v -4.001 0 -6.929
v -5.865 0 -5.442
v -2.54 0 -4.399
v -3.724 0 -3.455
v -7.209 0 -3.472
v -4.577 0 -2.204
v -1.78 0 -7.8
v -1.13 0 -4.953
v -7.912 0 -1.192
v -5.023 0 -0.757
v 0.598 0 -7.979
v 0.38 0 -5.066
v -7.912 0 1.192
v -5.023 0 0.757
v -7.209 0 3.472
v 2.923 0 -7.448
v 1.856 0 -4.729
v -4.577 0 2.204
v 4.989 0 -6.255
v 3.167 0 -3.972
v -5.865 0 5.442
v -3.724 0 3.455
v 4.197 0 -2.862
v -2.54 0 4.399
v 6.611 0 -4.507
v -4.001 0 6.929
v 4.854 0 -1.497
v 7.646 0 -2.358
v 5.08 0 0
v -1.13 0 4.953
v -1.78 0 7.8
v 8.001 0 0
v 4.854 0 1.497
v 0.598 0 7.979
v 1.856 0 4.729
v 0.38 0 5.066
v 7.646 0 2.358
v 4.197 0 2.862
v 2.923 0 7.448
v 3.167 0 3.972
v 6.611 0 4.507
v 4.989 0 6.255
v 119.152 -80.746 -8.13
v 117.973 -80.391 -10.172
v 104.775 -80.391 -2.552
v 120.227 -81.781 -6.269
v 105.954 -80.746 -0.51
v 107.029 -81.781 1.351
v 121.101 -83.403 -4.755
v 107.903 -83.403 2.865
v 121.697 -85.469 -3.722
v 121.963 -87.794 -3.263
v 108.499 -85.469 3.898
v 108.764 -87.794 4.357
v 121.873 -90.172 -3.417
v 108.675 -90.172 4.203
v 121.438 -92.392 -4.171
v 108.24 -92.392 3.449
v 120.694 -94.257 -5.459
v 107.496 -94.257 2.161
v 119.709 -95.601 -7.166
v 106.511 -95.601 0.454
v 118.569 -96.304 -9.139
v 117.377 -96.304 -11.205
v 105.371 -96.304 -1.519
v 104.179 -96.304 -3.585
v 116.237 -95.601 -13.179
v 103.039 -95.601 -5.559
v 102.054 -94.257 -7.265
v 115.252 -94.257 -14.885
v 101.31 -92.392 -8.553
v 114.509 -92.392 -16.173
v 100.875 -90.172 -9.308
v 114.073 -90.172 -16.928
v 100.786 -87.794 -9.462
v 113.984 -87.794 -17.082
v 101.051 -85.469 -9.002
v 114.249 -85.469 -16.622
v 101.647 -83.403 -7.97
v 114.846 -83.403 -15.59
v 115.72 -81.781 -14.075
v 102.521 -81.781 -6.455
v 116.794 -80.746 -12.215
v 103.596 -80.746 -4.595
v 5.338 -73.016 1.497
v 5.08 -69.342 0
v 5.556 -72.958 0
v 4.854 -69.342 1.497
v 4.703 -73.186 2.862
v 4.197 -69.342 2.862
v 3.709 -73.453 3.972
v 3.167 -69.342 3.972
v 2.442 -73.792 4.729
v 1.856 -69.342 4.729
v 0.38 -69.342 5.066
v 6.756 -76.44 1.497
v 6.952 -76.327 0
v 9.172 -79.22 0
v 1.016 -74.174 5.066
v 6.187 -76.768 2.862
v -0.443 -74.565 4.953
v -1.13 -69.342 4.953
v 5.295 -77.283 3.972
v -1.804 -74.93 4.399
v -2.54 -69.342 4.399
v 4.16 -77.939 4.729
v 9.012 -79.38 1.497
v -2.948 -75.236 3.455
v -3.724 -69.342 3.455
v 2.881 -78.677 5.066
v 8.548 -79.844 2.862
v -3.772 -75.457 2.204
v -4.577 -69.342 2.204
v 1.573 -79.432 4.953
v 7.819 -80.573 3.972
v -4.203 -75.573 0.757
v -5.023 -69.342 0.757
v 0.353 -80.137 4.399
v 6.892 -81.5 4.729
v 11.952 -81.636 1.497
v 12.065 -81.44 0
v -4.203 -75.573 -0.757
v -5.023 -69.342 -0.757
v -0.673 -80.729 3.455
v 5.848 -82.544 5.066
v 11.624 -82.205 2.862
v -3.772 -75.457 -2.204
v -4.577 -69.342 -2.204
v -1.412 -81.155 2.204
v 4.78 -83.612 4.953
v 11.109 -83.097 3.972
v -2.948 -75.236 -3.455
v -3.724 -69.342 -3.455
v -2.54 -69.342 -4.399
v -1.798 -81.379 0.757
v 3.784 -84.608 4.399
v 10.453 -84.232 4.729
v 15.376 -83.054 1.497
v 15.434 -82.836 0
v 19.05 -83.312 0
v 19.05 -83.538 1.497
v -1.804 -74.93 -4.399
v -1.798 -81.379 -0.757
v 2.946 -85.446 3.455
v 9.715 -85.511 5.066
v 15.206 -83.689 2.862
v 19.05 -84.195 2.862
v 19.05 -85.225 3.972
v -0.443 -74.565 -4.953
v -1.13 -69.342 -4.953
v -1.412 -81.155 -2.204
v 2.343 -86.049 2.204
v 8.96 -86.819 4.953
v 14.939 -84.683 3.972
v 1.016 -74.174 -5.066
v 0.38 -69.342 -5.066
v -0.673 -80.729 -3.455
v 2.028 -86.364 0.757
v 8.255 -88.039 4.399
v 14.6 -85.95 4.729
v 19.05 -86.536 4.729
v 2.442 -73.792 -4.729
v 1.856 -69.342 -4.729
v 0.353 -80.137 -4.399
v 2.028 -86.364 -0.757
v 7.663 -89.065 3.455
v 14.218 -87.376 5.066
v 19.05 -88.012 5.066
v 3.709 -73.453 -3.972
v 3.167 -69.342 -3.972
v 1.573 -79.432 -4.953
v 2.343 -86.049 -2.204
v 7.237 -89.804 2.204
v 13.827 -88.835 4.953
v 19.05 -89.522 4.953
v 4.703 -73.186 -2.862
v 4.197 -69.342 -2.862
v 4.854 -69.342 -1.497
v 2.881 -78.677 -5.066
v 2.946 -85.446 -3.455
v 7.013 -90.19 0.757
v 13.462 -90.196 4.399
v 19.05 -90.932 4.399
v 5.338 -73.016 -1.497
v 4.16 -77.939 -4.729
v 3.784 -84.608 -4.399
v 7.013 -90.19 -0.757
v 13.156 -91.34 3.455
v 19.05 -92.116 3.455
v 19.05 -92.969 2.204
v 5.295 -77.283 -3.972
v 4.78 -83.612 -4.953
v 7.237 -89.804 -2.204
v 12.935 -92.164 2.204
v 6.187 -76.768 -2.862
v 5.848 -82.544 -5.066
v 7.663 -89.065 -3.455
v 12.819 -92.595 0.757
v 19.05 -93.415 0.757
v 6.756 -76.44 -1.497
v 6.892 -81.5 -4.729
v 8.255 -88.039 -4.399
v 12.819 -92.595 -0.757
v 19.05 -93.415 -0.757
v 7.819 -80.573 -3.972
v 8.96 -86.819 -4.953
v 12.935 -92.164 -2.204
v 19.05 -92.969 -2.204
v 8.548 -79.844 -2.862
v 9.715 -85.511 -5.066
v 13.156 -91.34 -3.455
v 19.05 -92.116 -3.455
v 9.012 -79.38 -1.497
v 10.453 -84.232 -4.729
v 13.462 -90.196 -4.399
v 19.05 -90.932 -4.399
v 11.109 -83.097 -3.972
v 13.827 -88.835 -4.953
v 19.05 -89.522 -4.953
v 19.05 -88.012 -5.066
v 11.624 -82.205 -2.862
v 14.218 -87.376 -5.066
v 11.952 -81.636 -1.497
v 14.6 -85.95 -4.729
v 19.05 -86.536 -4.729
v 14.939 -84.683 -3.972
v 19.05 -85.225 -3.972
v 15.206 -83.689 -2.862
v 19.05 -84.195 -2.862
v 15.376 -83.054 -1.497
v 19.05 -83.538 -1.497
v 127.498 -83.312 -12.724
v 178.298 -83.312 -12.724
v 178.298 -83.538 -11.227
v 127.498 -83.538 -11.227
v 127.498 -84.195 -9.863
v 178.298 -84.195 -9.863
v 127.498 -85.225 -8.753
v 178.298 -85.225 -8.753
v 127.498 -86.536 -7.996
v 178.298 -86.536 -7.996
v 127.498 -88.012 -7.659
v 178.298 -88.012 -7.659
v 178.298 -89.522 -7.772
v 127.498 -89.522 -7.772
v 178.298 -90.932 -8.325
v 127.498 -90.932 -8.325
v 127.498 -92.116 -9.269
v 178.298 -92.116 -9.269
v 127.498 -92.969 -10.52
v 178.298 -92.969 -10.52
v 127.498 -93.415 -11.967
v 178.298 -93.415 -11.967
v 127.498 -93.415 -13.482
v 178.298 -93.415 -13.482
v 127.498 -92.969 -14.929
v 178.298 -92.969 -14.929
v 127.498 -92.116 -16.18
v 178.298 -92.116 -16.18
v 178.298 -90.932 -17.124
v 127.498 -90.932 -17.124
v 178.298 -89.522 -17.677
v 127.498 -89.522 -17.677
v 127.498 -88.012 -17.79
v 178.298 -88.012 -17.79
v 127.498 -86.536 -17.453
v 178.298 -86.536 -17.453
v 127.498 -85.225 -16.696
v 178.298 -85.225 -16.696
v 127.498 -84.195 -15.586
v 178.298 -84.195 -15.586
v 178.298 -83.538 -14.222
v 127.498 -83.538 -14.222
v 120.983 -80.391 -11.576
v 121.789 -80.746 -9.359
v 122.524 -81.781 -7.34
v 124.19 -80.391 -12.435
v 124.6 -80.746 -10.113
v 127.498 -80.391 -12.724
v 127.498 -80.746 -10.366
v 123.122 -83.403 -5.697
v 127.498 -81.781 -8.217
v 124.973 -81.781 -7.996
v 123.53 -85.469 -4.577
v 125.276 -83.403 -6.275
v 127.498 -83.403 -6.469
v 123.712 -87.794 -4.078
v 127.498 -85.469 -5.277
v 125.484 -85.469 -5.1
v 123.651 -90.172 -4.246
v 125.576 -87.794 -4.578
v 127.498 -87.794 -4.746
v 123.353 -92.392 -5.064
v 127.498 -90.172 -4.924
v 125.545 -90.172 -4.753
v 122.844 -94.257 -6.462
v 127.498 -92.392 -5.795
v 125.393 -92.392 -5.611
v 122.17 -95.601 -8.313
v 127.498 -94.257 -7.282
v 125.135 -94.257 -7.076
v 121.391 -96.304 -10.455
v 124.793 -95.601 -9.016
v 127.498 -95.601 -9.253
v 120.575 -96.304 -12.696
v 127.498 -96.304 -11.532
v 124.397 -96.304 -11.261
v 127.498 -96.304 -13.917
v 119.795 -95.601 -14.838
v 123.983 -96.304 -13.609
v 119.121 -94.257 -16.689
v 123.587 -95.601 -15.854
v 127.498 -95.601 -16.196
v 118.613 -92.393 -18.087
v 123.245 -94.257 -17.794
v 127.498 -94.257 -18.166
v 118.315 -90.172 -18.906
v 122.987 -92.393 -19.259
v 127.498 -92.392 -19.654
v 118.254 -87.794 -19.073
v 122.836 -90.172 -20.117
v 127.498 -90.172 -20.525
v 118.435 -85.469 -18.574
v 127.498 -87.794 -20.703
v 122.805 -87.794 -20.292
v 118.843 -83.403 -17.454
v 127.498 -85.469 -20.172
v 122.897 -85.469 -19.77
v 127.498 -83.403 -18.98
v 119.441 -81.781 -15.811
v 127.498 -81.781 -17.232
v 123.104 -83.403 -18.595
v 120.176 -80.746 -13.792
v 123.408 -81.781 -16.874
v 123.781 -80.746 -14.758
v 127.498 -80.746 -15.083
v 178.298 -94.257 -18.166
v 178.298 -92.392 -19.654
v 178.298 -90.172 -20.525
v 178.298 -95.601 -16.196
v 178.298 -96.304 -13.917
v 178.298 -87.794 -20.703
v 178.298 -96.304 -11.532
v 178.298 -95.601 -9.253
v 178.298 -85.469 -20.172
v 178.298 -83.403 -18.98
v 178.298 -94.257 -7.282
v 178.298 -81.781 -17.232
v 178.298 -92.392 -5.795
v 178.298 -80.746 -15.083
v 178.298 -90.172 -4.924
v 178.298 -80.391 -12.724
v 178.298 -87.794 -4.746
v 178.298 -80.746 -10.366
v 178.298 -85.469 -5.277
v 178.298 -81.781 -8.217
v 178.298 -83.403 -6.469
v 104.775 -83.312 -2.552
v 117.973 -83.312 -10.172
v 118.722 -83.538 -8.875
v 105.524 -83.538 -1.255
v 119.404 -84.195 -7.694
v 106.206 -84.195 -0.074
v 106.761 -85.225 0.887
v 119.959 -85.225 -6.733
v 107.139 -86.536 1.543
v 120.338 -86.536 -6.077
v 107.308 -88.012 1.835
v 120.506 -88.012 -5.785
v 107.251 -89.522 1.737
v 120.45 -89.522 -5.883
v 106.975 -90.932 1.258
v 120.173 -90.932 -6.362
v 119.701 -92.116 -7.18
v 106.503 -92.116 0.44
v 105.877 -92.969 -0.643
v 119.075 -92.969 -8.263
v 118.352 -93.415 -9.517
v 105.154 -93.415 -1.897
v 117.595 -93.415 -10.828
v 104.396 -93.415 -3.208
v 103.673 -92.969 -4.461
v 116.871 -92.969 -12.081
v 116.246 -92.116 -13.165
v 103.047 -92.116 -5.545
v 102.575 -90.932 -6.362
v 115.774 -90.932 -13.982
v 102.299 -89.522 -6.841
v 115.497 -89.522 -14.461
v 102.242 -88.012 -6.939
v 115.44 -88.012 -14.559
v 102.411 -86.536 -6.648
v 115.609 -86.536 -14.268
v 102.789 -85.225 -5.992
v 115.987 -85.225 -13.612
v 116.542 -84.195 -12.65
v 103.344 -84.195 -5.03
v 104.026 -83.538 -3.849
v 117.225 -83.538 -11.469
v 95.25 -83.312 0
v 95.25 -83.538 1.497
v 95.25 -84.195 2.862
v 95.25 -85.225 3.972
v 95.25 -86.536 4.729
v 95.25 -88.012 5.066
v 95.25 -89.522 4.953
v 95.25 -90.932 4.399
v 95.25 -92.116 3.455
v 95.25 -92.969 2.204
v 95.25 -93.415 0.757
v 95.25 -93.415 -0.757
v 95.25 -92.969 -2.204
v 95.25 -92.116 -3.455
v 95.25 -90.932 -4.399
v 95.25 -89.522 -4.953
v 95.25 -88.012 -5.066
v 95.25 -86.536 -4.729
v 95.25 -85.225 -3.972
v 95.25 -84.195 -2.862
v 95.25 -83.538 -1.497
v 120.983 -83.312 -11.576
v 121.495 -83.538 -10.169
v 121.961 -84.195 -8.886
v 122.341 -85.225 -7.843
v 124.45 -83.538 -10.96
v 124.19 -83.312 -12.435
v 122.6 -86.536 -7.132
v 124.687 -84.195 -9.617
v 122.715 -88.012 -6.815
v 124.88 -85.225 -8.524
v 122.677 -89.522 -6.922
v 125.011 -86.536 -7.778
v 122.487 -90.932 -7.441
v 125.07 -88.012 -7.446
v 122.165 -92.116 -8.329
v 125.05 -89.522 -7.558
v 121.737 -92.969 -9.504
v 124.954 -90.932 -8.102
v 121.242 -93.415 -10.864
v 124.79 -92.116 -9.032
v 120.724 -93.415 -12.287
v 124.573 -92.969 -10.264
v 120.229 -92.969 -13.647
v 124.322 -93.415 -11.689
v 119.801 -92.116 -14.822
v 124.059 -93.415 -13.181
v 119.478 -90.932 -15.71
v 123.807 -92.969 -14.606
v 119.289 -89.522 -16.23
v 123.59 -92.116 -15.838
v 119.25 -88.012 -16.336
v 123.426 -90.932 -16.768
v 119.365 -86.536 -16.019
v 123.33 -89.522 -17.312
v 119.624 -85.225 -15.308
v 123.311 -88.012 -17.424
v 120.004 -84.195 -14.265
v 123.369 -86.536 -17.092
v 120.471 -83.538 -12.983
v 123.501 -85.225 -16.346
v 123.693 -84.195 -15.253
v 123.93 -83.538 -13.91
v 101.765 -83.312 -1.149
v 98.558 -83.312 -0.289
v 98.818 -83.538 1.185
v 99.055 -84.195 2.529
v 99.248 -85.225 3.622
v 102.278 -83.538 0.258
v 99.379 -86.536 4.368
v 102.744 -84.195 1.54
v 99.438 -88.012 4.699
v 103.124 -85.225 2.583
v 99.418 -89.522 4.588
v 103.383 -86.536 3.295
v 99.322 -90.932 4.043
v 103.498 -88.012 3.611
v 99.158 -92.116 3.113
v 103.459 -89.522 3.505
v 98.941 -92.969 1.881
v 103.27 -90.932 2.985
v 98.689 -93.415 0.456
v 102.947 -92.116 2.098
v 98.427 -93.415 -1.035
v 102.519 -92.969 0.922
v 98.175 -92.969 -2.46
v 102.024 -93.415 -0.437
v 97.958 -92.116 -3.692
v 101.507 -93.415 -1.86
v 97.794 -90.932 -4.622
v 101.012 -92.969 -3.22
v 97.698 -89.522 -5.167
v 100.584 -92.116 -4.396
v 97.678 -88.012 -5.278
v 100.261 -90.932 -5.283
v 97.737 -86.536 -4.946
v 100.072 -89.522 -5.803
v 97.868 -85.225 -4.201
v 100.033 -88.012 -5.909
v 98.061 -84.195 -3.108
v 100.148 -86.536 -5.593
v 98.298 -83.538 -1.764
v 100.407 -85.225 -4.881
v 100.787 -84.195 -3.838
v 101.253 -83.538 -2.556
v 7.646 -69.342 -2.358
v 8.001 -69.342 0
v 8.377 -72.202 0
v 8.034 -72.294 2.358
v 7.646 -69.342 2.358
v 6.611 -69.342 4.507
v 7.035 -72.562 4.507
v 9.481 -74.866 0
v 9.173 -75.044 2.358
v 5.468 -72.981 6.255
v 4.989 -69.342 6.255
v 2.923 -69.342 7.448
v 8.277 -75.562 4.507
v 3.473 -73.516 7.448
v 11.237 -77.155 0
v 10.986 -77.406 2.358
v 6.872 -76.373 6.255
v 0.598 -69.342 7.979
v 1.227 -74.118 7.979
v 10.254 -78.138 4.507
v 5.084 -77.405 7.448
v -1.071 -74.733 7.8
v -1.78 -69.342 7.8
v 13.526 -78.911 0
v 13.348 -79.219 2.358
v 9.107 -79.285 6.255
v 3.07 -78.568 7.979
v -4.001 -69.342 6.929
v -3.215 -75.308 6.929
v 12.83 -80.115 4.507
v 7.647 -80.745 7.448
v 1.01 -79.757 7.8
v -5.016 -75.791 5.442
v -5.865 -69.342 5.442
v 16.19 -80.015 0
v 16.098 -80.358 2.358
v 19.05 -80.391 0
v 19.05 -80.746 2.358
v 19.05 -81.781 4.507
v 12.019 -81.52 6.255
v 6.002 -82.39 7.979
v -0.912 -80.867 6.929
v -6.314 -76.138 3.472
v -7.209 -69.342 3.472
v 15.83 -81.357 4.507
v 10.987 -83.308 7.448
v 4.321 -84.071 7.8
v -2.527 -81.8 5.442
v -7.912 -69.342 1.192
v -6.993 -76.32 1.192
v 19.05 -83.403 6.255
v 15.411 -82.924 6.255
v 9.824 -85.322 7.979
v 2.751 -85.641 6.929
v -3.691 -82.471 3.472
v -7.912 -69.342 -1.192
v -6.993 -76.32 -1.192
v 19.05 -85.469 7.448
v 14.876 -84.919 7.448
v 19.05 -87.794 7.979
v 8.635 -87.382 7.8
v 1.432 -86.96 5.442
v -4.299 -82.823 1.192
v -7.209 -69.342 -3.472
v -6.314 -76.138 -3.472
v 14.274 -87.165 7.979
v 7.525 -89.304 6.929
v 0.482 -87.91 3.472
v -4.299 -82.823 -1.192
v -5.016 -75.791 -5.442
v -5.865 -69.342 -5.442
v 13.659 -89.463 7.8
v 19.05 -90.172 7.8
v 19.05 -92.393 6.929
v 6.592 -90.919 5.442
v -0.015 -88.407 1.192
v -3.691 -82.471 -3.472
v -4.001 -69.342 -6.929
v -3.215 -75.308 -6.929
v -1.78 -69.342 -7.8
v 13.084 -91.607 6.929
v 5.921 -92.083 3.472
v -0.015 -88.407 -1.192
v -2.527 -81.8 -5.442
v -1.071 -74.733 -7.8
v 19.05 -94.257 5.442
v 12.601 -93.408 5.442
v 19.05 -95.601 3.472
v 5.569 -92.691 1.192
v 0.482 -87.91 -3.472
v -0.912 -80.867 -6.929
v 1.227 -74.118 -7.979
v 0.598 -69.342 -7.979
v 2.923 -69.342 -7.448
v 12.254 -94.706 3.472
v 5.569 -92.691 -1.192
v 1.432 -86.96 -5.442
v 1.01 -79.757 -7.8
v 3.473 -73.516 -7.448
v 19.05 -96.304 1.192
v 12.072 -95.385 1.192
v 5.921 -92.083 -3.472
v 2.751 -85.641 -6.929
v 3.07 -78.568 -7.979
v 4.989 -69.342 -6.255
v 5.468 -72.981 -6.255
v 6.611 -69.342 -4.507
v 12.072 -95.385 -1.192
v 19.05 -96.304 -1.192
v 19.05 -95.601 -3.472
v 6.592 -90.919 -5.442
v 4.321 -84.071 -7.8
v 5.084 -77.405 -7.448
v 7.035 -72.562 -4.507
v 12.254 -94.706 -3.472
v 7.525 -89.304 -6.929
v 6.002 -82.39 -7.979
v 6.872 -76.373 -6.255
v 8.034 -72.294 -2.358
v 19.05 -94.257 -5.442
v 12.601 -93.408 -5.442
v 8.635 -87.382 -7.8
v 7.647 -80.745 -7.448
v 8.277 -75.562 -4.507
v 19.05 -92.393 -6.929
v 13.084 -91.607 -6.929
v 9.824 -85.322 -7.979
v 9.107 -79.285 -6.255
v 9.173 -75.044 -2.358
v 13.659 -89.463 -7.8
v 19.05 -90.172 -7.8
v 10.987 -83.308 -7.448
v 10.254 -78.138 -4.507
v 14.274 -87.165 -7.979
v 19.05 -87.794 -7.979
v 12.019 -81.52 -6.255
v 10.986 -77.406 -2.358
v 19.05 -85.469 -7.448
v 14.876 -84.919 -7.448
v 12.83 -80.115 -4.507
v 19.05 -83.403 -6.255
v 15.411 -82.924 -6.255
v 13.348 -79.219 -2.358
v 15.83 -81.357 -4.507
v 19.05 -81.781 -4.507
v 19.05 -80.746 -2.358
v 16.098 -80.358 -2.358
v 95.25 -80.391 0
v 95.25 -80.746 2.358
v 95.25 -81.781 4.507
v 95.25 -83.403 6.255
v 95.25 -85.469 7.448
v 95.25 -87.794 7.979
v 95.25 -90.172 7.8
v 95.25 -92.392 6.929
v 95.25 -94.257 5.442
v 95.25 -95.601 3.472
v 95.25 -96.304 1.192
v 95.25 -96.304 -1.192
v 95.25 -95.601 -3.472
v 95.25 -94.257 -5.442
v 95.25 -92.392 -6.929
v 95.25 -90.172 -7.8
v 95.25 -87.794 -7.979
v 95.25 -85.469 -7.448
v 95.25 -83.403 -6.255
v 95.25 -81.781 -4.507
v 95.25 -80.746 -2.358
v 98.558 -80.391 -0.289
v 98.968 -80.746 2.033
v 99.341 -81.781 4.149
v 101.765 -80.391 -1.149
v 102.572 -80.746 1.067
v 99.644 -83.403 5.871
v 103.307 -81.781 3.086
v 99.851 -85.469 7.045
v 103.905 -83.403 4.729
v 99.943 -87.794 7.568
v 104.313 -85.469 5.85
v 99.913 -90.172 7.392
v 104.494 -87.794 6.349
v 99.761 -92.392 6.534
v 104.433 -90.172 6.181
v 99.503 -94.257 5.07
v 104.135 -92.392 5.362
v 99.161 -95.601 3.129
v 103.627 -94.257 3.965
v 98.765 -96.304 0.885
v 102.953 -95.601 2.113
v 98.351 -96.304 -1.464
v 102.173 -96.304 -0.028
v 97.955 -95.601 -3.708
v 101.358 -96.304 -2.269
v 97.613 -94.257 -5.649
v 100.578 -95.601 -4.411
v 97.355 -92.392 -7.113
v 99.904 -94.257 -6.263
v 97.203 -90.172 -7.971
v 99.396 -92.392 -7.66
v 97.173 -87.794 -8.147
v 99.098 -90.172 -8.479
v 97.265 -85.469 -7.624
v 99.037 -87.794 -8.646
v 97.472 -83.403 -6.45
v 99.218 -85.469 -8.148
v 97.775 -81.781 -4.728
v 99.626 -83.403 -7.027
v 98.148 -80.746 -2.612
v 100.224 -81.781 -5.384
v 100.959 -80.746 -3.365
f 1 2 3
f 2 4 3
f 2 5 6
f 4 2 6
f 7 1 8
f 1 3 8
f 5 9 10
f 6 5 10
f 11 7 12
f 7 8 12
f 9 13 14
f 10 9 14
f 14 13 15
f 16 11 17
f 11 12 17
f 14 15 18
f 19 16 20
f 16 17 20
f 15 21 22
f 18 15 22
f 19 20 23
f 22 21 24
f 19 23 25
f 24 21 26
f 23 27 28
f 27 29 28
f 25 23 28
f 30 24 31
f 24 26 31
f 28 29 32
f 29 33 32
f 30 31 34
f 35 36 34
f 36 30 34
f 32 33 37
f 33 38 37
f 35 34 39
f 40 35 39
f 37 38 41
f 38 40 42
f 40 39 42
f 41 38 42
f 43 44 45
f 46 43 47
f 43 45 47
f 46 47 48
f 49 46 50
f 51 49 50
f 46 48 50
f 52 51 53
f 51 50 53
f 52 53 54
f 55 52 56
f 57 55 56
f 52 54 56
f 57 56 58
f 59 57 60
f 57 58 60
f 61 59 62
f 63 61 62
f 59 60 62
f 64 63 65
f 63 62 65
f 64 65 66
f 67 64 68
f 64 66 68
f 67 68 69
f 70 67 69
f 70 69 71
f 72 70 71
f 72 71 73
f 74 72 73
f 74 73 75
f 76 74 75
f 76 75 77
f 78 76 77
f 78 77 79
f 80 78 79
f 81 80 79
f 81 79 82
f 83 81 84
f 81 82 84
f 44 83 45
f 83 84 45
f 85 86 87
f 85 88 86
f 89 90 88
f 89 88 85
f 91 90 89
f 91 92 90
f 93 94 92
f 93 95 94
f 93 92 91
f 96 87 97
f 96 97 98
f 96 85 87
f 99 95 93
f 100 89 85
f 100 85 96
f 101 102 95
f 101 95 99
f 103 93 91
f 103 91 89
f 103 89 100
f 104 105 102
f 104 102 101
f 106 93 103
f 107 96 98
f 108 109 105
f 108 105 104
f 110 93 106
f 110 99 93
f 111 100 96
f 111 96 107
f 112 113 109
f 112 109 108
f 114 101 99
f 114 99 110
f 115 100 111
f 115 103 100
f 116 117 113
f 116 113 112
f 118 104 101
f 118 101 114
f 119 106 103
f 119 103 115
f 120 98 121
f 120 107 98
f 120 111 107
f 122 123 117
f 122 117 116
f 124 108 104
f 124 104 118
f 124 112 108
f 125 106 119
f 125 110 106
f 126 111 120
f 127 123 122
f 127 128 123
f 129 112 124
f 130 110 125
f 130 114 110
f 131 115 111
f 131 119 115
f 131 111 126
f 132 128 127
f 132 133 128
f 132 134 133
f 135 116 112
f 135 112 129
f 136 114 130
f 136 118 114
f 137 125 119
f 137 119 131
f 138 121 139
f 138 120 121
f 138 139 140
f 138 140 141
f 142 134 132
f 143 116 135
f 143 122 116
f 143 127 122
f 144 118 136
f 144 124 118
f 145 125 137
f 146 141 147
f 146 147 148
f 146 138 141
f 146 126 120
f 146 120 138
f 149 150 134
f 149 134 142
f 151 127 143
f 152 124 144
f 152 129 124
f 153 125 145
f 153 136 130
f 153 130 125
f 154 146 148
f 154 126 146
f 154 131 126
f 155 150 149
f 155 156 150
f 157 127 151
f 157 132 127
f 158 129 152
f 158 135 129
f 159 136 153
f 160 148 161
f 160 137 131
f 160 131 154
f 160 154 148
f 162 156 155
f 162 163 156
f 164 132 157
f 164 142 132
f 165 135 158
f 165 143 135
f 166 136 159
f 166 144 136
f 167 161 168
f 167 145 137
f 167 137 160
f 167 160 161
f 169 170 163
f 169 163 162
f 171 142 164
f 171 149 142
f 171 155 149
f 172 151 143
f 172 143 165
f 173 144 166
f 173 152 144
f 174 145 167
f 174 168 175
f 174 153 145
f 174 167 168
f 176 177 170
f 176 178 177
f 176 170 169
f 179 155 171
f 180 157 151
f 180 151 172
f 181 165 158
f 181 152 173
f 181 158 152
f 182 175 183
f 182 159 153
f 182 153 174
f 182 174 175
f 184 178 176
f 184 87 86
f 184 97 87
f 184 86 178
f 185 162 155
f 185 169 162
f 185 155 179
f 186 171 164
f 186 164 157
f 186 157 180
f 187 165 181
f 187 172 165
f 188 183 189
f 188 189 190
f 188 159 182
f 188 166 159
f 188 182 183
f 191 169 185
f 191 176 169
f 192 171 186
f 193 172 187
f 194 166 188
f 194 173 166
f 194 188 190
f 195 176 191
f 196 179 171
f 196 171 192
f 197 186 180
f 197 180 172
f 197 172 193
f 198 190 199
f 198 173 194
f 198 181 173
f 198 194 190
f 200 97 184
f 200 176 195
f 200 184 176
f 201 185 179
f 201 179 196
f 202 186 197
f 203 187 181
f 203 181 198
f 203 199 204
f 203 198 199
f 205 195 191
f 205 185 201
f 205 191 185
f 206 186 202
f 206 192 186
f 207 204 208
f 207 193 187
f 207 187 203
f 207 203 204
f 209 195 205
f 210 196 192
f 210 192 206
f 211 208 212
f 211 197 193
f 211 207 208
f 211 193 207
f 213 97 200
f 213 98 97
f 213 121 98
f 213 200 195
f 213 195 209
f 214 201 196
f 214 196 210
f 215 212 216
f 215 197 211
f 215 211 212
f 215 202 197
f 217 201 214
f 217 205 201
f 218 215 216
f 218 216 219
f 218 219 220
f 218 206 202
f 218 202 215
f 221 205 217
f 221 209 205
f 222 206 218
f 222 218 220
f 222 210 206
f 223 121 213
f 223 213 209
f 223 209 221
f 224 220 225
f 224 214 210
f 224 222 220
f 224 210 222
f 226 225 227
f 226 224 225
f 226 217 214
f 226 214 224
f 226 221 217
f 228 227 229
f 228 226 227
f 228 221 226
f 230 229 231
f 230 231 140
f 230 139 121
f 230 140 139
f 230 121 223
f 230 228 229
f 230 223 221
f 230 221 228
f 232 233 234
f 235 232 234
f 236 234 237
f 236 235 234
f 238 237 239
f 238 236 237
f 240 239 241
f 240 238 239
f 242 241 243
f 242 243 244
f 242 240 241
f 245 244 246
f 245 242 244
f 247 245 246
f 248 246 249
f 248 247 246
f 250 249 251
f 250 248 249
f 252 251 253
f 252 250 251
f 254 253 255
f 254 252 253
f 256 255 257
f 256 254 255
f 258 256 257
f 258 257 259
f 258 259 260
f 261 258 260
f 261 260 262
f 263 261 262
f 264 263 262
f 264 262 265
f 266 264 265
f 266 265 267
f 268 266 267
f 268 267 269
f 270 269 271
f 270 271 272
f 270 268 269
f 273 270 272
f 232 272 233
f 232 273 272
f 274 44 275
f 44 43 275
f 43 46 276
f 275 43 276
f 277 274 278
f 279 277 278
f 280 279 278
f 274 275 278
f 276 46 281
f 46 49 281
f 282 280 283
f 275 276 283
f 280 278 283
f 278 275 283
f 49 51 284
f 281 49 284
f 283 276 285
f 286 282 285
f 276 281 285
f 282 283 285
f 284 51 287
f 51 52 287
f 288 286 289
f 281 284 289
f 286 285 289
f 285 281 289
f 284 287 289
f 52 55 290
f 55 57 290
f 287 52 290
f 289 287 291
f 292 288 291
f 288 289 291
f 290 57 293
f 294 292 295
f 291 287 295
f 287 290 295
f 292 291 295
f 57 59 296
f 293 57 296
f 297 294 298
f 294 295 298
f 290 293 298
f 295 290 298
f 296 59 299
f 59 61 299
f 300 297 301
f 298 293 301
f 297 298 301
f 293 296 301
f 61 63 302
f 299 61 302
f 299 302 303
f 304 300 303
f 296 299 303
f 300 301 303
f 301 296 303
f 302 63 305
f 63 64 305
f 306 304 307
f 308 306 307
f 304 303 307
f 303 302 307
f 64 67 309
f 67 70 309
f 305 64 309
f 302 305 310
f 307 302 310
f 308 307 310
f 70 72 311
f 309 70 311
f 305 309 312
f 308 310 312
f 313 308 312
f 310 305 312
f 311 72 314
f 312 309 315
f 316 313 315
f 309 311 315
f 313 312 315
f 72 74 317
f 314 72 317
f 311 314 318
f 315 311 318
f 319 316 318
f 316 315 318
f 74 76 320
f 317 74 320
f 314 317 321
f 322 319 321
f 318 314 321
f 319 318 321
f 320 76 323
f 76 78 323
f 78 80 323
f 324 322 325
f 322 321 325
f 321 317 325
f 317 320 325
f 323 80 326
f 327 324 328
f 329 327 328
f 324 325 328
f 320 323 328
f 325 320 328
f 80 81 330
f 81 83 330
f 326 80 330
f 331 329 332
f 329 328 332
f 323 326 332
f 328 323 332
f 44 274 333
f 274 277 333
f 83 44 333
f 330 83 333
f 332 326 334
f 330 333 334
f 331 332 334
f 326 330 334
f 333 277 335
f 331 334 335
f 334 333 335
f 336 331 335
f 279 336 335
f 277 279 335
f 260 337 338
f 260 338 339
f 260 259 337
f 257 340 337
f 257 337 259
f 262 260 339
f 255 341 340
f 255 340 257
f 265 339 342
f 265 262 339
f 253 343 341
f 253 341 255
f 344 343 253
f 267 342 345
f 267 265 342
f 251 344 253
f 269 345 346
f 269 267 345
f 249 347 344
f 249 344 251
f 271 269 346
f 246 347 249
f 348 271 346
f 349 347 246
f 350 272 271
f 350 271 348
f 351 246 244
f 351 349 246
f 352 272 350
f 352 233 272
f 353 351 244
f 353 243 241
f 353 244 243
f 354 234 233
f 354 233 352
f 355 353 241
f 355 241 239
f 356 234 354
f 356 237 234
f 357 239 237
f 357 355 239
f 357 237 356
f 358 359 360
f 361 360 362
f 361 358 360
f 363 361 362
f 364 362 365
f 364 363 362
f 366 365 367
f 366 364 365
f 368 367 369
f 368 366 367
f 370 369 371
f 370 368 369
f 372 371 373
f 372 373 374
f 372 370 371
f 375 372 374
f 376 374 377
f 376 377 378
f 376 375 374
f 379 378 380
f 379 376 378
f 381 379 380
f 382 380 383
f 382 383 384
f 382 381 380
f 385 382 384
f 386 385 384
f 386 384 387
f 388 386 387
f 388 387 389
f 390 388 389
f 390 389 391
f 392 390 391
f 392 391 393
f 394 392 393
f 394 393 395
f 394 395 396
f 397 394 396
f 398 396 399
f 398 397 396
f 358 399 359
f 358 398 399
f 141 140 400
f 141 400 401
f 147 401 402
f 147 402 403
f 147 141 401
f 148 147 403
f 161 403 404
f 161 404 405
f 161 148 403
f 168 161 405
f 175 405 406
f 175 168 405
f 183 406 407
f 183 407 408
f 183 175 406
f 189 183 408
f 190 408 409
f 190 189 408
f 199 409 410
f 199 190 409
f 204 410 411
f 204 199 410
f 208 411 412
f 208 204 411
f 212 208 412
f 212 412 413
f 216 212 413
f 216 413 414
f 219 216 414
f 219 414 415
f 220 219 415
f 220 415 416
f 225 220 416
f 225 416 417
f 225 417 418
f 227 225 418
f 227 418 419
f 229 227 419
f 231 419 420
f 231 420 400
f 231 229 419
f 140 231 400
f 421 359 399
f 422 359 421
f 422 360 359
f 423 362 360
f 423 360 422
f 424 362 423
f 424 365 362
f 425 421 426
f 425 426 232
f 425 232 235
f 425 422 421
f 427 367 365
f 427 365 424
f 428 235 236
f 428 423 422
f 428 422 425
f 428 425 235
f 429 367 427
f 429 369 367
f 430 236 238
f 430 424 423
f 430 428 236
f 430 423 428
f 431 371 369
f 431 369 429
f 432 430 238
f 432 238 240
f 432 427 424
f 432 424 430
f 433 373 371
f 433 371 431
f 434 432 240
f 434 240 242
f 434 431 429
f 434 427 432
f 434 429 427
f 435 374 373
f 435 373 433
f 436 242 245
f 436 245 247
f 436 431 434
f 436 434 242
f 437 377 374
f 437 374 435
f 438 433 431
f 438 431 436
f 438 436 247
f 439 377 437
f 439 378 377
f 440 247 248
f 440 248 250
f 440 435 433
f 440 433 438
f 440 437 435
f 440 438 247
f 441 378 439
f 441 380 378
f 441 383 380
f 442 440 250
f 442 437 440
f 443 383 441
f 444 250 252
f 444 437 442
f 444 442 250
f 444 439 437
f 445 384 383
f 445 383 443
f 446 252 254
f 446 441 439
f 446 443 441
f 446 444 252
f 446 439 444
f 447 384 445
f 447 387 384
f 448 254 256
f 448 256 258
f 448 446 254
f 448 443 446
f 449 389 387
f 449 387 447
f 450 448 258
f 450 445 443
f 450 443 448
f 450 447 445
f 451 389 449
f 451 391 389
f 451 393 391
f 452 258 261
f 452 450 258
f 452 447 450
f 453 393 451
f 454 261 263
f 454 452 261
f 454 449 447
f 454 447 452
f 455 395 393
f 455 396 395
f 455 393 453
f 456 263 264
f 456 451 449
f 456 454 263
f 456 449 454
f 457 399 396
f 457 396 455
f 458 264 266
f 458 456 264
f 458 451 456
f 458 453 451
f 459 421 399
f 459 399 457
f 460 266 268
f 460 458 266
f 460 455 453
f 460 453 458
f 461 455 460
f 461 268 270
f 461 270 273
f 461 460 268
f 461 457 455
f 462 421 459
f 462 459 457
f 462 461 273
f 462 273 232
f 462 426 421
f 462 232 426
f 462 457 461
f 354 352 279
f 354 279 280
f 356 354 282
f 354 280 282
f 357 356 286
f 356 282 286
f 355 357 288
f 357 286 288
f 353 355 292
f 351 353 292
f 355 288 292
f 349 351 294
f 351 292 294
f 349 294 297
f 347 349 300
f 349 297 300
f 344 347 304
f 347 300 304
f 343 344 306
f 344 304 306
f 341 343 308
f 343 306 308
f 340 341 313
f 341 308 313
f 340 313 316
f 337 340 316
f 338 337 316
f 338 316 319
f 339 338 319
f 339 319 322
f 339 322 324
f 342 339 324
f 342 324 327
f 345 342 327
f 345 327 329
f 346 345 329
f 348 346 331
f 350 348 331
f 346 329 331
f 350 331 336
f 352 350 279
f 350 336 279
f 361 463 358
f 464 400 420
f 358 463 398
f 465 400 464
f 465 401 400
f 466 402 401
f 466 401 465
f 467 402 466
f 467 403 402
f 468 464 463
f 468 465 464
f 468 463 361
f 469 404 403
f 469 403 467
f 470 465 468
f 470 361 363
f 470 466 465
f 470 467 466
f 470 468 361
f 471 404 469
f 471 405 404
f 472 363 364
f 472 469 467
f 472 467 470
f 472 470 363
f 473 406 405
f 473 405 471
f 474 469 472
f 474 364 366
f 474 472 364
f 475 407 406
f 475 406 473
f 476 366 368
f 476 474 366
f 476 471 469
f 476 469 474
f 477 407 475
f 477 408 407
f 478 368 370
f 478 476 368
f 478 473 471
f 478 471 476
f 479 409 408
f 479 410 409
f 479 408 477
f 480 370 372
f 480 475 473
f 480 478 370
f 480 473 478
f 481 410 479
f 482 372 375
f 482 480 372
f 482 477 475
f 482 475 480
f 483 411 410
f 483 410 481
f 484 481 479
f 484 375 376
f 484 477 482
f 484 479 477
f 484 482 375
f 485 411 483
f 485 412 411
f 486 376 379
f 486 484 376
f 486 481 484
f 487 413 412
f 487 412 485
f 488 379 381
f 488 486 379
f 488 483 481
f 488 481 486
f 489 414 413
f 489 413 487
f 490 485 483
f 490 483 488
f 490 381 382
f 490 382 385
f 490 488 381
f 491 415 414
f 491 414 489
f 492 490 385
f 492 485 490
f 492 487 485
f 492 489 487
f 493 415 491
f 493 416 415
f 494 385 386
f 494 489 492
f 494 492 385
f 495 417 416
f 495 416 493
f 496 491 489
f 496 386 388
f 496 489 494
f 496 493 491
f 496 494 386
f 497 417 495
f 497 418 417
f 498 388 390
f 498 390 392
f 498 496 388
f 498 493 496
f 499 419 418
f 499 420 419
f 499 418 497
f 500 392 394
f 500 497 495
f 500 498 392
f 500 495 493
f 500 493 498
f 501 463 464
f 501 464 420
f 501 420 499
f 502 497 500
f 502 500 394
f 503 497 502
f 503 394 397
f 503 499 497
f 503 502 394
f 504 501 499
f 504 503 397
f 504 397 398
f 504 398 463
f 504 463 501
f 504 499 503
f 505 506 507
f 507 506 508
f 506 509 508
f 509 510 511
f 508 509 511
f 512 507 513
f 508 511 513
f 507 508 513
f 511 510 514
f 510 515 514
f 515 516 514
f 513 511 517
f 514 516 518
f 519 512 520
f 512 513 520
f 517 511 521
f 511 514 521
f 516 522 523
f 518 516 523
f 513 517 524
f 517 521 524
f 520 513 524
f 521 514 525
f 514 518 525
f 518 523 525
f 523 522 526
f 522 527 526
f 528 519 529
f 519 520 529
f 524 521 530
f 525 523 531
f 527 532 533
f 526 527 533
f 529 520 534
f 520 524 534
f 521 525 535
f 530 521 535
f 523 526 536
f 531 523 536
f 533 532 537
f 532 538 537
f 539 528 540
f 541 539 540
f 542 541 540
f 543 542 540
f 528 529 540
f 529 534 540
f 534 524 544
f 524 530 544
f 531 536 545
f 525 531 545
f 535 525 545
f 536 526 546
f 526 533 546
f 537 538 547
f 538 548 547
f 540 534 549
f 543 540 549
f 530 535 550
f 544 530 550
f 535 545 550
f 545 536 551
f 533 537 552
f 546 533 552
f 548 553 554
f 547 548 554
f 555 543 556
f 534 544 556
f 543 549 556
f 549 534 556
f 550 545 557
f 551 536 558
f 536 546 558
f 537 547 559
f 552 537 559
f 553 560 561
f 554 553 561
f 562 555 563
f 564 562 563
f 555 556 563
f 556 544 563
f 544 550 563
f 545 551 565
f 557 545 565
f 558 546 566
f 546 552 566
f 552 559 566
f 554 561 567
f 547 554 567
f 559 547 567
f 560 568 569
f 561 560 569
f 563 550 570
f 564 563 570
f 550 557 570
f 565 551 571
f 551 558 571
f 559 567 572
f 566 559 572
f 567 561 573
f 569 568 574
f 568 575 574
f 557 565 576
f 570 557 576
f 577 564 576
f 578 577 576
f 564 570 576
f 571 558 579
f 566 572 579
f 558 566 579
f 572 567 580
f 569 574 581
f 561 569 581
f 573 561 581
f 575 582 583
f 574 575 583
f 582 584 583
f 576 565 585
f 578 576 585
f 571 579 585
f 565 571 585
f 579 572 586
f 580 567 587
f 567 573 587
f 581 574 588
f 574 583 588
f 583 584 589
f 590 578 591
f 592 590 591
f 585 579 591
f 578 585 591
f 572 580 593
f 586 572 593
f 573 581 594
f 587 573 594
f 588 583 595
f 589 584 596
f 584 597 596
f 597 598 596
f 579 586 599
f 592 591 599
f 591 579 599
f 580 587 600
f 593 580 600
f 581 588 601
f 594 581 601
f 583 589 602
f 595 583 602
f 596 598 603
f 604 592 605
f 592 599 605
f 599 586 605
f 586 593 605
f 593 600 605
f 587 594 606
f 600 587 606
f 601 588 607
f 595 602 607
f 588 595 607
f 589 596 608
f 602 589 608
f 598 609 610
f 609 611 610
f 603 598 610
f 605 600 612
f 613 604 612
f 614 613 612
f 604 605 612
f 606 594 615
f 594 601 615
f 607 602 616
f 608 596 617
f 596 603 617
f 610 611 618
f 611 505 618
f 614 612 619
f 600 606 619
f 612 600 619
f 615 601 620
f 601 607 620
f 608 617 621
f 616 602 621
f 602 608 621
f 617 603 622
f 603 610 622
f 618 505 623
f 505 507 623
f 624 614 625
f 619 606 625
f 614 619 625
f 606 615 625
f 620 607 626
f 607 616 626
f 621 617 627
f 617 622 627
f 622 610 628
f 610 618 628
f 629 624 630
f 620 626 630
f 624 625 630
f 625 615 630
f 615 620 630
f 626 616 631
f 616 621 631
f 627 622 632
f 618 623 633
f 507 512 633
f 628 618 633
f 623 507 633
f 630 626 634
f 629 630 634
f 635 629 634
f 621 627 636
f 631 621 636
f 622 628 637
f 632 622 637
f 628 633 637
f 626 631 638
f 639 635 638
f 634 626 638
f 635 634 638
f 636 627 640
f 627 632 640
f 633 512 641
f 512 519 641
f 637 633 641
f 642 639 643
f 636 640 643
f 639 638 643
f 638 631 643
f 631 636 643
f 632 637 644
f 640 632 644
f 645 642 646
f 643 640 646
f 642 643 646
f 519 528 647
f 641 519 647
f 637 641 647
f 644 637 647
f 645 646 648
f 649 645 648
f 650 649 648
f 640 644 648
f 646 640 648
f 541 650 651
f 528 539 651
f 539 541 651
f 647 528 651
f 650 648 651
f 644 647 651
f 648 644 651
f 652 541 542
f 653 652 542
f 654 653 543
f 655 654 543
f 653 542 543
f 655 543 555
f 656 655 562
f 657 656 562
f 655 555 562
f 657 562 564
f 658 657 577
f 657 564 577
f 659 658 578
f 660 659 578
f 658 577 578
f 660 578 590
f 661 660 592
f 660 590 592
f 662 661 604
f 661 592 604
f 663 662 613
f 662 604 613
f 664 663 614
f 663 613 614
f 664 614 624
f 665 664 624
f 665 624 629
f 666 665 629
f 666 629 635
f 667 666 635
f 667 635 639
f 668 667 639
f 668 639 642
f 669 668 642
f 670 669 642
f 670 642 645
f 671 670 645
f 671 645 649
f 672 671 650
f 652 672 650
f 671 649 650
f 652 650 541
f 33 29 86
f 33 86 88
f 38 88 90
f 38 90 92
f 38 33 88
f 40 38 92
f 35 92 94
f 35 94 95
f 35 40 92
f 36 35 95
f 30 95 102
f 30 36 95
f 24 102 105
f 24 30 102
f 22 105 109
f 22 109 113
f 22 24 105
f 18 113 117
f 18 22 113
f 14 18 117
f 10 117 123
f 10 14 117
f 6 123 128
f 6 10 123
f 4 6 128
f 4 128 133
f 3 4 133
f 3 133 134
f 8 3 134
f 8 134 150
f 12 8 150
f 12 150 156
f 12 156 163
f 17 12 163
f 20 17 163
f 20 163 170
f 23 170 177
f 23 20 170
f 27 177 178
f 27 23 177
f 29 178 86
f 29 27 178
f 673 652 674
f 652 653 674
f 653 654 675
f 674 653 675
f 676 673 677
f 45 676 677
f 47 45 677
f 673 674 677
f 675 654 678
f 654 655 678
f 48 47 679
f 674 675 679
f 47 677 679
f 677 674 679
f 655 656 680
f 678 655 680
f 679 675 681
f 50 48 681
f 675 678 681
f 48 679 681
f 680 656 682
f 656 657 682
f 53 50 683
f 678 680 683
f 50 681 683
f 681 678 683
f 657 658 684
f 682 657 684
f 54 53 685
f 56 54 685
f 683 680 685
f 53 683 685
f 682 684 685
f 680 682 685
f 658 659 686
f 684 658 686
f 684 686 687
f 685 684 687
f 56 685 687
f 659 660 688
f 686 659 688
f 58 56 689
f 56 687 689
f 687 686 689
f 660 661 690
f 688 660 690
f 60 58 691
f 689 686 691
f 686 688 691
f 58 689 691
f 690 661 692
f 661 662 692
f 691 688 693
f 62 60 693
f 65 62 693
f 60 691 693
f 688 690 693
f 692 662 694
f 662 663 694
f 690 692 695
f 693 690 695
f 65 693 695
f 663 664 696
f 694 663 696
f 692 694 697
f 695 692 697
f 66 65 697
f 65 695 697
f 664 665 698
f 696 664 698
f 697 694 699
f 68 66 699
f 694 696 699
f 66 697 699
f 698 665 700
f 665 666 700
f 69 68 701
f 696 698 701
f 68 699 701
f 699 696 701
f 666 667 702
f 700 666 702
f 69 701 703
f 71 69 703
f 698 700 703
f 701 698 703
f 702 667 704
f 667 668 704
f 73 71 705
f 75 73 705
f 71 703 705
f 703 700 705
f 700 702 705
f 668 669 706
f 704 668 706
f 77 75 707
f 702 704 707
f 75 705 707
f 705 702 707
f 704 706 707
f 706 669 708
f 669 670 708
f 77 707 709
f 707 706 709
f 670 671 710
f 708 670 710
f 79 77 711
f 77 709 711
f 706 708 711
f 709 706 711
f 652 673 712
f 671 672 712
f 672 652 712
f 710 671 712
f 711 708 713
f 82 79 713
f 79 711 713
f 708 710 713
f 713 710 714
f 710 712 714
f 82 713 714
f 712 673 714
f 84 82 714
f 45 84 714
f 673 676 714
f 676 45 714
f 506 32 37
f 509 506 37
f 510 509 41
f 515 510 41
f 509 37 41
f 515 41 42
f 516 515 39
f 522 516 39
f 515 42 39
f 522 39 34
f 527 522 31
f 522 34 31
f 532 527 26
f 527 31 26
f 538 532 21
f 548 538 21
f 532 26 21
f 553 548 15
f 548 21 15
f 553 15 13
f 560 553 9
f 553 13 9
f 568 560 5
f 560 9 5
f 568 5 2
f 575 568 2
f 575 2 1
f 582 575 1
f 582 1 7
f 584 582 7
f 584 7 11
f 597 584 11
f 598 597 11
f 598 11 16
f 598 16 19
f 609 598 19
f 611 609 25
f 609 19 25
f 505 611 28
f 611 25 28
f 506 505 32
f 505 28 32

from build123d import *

# Parameters (mm, degrees)
F0_R      = 8.001
F0_R_2    = 5.08
F1_DEPTH  = 69.342
F2_R      = 8.001
F2_R_2    = 5.08
F3_ANGLE  = 90
F4_R      = 8.001
F4_R_2    = 5.08
F5_DEPTH  = 76.2
F6_R      = 8.001
F6_R_2    = 5.08
F7_ANGLE  = 30
F8_R      = 8.001
F8_R_2    = 5.08
F9_DEPTH  = 15.24
F10_R     = 8.001
F10_R_2   = 5.08
F11_ANGLE = 30
F12_R     = 8.001
F12_R_2   = 5.08
F13_DEPTH = 50.8


with BuildPart() as f1:
    # F0 (on Front) → F1 (new body)
    with BuildSketch(Plane.XZ):
        Circle(F0_R)
        Circle(F0_R_2, mode=Mode.SUBTRACT)
    extrude(amount=F1_DEPTH)

    # F2 (on face) → F3 (revolve)
    with BuildSketch(Plane.XZ.offset(69.342)):
        Circle(F2_R)
        Circle(F2_R_2, mode=Mode.SUBTRACT)
    revolve(axis=Axis((19.05, -69.342, 0.0863848254), (0, 0, 1)), revolution_arc=F3_ANGLE)

    # F4 (on face) → F5 (join)
    with BuildSketch(Plane.YZ.offset(19.05)):
        with Locations((-88.392, 0)):
            Circle(F4_R)
        with Locations((-88.392, 0)):
            Circle(F4_R_2, mode=Mode.SUBTRACT)
    extrude(amount=F5_DEPTH)

    # F6 (on face) → F7 (revolve)
    with BuildSketch(Plane.YZ.offset(95.25)):
        with Locations((-88.392, 0)):
            Circle(F6_R)
        with Locations((-88.392, 0)):
            Circle(F6_R_2, mode=Mode.SUBTRACT)
    revolve(axis=Axis((95.25, -87.3048111362, -19.05), (0, 1, 0)), revolution_arc=F7_ANGLE)

    # F8 (on face) → F9 (join)
    with BuildSketch(Plane(origin=(79.686391971, 0, -46.0069598552), x_dir=(0, 1, 0), z_dir=(0.8660254038, 0, -0.5))):
        with Locations((-88.392, 50.1772160579)):
            Circle(F8_R)
        with Locations((-88.392, 50.1772160579)):
            Circle(F8_R_2, mode=Mode.SUBTRACT)
    extrude(amount=F9_DEPTH)

    # F10 (on face) → F11 (revolve)
    with BuildSketch(Plane(origin=(92.8846191247, 0, -53.6269598552), x_dir=(0, 1, 0), z_dir=(0.8660254038, 0, -0.5))):
        with Locations((-88.392, 50.1772160579)):
            Circle(F10_R)
        with Locations((-88.392, 50.1772160579)):
            Circle(F10_R_2, mode=Mode.SUBTRACT)
    revolve(axis=Axis((127.4982271537, -88.2504015727, 6.3255678842), (0, -1, 0)), revolution_arc=F11_ANGLE)

    # F12 (on face) → F13 (join)
    with BuildSketch(Plane.YZ.offset(127.4982271537)):
        with Locations((-88.392, -12.7244321158)):
            Circle(F12_R)
        with Locations((-88.392, -12.7244321158)):
            Circle(F12_R_2, mode=Mode.SUBTRACT)
    extrude(amount=F13_DEPTH)


solid = f1.part
